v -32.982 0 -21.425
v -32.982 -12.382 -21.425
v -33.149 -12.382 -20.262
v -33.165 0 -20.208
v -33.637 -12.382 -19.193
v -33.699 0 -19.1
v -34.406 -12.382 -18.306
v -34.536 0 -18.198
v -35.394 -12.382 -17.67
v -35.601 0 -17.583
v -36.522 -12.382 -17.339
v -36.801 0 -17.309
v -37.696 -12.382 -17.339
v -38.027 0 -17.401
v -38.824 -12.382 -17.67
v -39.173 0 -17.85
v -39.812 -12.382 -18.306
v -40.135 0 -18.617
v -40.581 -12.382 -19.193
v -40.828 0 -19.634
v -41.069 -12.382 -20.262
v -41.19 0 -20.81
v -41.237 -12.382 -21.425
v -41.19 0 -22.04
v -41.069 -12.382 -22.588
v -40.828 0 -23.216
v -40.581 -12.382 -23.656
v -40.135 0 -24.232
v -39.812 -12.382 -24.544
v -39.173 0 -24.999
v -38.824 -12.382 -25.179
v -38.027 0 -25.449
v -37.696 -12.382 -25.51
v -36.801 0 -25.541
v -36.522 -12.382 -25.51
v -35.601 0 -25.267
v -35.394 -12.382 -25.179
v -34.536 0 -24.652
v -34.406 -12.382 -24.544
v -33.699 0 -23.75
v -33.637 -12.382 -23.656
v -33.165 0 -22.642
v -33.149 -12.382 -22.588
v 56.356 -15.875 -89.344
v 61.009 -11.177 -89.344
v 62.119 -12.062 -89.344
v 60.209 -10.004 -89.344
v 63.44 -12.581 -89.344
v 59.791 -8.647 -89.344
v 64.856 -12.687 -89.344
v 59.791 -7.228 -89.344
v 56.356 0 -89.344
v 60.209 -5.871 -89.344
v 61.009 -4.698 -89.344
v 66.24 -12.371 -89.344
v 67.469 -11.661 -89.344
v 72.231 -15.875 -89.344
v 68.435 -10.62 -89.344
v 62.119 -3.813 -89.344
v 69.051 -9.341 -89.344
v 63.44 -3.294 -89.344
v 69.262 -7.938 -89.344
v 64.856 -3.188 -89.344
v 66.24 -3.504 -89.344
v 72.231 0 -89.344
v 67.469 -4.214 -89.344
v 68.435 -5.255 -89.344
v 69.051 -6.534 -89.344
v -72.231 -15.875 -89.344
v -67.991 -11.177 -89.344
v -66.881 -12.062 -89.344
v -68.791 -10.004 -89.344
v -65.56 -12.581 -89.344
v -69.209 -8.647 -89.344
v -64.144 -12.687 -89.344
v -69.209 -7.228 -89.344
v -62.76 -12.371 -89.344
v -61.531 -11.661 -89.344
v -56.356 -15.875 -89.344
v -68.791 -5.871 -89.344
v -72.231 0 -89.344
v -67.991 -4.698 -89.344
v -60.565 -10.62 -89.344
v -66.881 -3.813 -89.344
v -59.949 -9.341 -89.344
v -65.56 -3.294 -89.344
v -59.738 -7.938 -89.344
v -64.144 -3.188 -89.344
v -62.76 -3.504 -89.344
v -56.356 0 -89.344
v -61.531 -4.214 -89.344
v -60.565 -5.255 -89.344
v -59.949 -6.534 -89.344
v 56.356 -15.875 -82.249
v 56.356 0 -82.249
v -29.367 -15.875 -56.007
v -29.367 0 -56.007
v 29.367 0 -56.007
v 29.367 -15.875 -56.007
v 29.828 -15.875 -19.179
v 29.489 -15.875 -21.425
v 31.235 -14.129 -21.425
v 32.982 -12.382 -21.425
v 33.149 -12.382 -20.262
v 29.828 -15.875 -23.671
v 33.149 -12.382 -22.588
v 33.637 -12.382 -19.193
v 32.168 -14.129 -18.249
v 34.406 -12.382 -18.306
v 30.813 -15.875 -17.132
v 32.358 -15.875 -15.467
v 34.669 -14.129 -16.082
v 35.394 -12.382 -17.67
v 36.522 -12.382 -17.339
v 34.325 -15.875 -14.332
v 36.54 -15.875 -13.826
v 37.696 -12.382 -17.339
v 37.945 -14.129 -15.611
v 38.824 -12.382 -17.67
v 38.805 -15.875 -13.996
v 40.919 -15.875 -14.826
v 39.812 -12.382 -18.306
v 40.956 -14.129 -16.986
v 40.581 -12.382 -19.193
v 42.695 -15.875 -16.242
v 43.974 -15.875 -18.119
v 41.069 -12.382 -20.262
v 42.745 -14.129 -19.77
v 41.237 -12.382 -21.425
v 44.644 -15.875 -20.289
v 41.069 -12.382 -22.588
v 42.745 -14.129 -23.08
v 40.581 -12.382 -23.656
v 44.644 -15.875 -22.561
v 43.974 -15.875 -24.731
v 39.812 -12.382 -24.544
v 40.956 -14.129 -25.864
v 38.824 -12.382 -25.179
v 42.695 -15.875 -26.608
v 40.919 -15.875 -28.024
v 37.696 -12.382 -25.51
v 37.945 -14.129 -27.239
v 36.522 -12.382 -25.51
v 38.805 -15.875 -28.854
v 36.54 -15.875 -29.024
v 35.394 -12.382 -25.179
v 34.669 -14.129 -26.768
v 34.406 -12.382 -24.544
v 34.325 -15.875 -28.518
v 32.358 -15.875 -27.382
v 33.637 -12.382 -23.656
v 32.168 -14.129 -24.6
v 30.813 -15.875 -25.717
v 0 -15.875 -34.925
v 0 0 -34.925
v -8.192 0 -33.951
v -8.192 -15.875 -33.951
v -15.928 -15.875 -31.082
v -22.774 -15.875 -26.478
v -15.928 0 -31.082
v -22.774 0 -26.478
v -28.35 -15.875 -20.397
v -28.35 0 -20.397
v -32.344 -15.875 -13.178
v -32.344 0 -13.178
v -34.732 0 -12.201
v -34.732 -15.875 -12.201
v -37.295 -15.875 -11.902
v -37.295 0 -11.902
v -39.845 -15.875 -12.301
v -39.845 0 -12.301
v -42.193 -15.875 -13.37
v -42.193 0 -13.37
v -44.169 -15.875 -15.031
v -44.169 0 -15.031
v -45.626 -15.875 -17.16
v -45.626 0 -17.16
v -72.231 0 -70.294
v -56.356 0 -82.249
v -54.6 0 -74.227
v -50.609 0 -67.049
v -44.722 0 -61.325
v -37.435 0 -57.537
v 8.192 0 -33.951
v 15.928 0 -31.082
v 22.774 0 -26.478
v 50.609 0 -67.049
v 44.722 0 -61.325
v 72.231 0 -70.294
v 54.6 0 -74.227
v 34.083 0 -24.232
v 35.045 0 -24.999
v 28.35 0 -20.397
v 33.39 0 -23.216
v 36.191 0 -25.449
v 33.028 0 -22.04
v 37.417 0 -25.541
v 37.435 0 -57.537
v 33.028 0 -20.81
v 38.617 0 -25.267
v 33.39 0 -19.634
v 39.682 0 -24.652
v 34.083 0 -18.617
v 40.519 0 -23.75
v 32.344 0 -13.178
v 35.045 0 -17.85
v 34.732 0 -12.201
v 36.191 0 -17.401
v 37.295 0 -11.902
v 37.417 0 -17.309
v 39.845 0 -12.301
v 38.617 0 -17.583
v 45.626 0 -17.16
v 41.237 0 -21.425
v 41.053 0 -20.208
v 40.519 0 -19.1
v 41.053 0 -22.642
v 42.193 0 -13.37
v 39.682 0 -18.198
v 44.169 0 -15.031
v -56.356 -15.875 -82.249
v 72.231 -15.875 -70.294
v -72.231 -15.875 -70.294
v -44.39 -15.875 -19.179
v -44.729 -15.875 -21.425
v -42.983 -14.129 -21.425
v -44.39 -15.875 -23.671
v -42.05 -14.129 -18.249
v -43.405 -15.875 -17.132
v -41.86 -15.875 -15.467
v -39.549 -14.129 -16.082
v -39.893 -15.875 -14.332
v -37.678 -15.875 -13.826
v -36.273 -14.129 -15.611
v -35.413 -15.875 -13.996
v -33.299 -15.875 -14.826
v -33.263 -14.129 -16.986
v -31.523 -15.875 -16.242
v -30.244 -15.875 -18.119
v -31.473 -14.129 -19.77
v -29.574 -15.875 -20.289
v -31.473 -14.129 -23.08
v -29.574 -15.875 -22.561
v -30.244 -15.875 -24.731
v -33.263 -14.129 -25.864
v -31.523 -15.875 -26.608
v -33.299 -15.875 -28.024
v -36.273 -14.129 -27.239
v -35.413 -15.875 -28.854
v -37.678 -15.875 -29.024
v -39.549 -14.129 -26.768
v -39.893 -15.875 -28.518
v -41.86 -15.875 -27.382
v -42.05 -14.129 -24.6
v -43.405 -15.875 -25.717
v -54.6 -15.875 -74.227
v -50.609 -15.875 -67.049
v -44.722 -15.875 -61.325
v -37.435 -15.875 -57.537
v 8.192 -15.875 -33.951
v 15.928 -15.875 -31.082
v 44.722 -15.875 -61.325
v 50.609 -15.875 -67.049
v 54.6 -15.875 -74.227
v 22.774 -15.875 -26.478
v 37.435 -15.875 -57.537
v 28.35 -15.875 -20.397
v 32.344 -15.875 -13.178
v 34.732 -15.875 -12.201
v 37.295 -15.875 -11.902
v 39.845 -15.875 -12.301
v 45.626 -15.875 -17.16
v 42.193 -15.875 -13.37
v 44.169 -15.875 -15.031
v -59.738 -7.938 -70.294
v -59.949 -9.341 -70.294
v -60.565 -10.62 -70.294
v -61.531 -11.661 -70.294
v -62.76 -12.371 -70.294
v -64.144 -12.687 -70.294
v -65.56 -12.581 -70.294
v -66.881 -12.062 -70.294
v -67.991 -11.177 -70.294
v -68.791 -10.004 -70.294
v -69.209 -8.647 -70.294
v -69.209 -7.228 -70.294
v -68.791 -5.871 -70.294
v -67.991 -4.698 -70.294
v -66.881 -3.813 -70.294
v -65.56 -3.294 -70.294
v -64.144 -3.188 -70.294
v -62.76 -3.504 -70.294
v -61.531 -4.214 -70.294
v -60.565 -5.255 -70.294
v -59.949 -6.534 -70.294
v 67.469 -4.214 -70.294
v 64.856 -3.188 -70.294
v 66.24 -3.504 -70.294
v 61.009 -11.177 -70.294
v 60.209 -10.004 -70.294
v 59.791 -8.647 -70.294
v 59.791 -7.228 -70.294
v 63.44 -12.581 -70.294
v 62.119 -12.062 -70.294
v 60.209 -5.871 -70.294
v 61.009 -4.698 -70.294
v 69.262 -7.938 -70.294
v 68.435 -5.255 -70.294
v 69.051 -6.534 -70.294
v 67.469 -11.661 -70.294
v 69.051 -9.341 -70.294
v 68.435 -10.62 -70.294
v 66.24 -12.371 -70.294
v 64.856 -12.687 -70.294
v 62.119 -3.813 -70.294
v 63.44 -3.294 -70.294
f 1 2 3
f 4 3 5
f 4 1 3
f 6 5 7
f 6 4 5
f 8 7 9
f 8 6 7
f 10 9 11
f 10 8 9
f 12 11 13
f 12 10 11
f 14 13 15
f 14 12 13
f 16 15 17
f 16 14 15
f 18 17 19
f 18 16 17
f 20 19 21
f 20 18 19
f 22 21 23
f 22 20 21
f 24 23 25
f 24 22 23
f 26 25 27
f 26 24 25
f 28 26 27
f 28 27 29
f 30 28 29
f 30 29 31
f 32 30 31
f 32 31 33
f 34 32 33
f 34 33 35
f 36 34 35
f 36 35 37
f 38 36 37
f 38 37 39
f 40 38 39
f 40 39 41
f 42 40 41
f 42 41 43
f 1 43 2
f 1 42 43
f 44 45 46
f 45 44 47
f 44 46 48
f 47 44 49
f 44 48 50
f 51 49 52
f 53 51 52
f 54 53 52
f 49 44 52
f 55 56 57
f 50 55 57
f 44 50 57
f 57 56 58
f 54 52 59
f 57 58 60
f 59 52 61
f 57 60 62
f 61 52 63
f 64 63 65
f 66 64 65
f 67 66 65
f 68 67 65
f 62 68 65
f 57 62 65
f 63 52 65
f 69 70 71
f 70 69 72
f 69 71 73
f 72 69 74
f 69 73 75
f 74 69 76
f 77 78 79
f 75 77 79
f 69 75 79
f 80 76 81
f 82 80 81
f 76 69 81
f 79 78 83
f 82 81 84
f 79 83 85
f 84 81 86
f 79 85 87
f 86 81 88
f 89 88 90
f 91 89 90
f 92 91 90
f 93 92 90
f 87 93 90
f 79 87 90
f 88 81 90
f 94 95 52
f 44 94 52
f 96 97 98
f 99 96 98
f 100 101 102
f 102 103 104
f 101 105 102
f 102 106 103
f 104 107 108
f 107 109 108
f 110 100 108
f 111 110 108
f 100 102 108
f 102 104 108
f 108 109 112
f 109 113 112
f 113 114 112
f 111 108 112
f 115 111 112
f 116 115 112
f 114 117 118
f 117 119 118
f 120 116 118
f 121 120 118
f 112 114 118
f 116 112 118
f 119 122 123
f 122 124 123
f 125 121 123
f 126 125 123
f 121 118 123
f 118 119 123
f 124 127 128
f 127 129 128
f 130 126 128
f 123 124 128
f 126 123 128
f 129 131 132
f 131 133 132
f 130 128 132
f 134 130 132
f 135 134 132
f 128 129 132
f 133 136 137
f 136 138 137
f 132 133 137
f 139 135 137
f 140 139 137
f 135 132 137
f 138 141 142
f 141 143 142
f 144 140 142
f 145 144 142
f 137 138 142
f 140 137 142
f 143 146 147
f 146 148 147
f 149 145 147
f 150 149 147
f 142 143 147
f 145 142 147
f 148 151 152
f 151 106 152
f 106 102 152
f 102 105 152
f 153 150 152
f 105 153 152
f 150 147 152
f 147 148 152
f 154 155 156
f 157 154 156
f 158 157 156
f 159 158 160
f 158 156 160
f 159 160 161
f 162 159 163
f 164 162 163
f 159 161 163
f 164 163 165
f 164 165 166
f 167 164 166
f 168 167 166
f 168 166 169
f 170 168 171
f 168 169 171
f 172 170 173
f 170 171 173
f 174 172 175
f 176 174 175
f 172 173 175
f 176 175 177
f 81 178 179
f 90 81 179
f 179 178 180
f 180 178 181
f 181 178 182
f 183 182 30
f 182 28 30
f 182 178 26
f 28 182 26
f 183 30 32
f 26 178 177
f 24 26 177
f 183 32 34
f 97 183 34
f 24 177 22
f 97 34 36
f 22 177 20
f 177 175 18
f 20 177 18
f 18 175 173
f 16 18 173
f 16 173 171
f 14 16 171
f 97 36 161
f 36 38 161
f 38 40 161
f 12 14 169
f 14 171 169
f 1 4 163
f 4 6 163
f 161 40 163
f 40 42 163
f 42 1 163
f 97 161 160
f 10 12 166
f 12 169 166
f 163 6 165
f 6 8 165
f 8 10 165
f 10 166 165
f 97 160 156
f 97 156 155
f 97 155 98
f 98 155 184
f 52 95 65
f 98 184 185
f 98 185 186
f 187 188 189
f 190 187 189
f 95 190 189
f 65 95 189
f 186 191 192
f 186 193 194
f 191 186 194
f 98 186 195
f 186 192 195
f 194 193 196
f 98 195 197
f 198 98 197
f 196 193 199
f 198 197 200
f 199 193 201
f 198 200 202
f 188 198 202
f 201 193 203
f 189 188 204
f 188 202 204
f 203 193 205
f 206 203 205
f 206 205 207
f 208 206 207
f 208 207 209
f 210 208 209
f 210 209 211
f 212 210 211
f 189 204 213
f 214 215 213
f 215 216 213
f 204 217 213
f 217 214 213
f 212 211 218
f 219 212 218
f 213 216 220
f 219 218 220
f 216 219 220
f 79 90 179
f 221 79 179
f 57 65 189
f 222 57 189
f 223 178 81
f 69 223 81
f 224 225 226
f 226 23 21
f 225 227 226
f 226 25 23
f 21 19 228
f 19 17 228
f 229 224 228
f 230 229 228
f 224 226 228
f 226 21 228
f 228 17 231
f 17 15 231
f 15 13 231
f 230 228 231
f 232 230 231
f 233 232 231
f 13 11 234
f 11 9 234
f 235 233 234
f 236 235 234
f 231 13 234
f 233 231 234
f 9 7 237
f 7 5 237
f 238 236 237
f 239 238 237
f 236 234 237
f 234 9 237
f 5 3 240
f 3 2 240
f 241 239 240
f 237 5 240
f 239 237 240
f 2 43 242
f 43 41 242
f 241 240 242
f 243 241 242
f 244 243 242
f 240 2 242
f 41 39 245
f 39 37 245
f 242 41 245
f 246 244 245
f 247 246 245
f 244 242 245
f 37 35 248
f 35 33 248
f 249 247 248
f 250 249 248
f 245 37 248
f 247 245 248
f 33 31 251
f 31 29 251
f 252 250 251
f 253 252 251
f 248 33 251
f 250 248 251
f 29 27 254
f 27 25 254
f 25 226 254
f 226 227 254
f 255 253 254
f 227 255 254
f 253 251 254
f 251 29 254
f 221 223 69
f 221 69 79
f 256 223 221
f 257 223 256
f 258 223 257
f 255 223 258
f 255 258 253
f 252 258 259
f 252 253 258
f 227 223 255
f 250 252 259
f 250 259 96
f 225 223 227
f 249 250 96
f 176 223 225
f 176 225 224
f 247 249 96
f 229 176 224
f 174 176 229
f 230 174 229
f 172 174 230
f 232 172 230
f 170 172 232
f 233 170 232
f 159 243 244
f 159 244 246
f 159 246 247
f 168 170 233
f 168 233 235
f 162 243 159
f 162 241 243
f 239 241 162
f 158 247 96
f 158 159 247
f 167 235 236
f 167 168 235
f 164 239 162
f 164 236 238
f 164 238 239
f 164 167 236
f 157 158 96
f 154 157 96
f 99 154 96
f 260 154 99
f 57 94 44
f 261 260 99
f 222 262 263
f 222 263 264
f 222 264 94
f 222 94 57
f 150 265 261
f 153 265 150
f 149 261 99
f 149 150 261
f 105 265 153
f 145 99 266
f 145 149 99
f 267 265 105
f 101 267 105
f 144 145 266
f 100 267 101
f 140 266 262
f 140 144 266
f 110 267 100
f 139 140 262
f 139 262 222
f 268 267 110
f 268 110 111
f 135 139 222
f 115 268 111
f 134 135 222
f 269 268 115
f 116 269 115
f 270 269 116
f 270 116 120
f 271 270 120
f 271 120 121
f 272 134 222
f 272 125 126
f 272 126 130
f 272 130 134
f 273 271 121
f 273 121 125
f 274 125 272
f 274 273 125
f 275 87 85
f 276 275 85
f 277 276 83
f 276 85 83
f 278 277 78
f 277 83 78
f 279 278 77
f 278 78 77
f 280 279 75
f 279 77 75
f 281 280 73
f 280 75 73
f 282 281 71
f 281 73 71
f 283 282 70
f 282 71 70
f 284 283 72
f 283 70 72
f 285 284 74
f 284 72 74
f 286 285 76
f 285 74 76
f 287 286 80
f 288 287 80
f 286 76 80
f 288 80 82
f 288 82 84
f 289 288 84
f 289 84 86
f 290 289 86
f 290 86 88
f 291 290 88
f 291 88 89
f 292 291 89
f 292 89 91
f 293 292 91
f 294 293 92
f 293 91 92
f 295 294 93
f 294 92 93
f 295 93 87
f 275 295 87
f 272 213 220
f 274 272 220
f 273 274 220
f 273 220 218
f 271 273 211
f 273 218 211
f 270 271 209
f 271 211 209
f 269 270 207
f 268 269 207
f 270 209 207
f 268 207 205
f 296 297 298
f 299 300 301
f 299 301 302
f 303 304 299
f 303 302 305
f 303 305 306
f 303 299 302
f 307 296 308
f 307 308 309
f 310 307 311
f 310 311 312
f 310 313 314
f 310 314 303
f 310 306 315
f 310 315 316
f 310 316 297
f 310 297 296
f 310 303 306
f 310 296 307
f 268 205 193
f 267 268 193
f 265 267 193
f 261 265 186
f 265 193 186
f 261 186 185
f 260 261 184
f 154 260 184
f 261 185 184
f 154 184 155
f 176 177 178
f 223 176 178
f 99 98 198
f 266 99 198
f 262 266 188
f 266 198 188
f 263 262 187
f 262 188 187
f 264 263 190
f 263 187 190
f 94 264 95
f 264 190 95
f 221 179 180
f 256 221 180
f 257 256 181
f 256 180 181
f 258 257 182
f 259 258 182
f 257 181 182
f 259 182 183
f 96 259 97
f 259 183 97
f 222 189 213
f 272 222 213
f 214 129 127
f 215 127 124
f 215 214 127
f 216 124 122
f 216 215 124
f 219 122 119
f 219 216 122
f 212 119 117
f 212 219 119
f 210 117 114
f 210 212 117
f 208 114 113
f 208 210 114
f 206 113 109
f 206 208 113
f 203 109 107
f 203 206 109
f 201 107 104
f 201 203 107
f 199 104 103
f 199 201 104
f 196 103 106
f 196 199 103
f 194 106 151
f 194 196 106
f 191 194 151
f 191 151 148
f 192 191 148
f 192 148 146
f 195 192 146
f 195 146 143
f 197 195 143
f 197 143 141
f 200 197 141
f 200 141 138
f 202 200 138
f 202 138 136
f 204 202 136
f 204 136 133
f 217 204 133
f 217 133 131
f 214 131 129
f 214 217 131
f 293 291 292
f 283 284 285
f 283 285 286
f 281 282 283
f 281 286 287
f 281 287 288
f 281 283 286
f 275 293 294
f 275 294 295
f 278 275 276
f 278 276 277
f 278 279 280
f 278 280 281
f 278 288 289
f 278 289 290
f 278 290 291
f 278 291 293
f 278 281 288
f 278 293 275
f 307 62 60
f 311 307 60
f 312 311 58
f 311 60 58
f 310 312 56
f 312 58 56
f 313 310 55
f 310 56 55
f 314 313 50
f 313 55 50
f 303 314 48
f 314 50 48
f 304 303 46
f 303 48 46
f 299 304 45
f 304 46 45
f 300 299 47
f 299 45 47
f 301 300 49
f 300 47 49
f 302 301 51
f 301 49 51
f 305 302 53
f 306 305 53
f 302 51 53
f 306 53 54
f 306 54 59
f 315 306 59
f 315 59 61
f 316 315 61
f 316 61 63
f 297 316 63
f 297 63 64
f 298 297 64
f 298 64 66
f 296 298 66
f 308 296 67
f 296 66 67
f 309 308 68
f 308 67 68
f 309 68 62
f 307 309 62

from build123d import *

# Parameters (mm, degrees)
F0_R           = 4.1275
F1_DEPTH       = 15.875
F3_D           = 8.255
F3_DEPTH       = 25.4
F3_CSINK_D     = 15.24
F3_CSINK_ANGLE = 90
F4_R           = 4.7625
F5_DEPTH       = 19.05


with BuildPart() as f1:
    # F0 (on Front) → F1 (new body)
    with BuildSketch(Plane.XZ):
        with BuildLine():
            ThreePointArc((0, -34.925), (-19.48747, -28.982653), (-32.343511, -13.177743))
            ThreePointArc((-32.343511, -13.177743), (-39.844625, -12.301191), (-45.625986, -17.160297))
            Line((-45.625986, -17.160297), (-72.23125, -70.2945))
            Line((-72.23125, -70.2945), (-72.23125, -89.3445))
            Line((-72.23125, -89.3445), (-56.35625, -89.3445))
            Line((-56.35625, -89.3445), (-56.35625, -86.1695))
            ThreePointArc((-56.35625, -86.1695), (-56.424398, -84.209267), (-56.35625, -82.249034))
            ThreePointArc((-56.35625, -82.249034), (-47.874791, -63.97181), (-29.36658, -56.007))
            ThreePointArc((-29.36658, -56.007), (-28.197928, -55.982797), (-27.029276, -56.007))
            Line((-27.029276, -56.007), (0, -56.007))
            Line((0, -56.007), (0, -34.925))
        make_face()
        with Locations((-37.109015, -21.4249)):
            Circle(F0_R, mode=Mode.SUBTRACT)
        with BuildLine():
            ThreePointArc((32.343511, -13.177743), (19.48747, -28.982653), (0, -34.925))
            Line((0, -34.925), (0, -56.007))
            Line((0, -56.007), (27.029276, -56.007))
            ThreePointArc((27.029276, -56.007), (28.197928, -55.982797), (29.36658, -56.007))
            ThreePointArc((29.36658, -56.007), (47.874791, -63.97181), (56.35625, -82.249034))
            ThreePointArc((56.35625, -82.249034), (56.424398, -84.209267), (56.35625, -86.1695))
            Line((56.35625, -86.1695), (56.35625, -89.3445))
            Line((56.35625, -89.3445), (72.23125, -89.3445))
            Line((72.23125, -89.3445), (72.23125, -70.2945))
            Line((72.23125, -70.2945), (45.625986, -17.160297))
            ThreePointArc((45.625986, -17.160297), (39.844625, -12.301191), (32.343511, -13.177743))
        make_face()
        with Locations((37.109015, -21.4249)):
            Circle(F0_R, mode=Mode.SUBTRACT)
        with BuildLine():
            Line((-29.36658, -56.007), (-27.029276, -56.007))
            ThreePointArc((-27.029276, -56.007), (-28.197928, -55.982797), (-29.36658, -56.007))
        make_face()
        with BuildLine():
            ThreePointArc((29.36658, -56.007), (28.197928, -55.982797), (27.029276, -56.007))
            Line((27.029276, -56.007), (29.36658, -56.007))
        make_face()
        with BuildLine():
            Line((-56.35625, -86.1695), (-56.35625, -82.249034))
            ThreePointArc((-56.35625, -82.249034), (-56.424398, -84.209267), (-56.35625, -86.1695))
        make_face()
        with BuildLine():
            ThreePointArc((56.35625, -86.1695), (56.424398, -84.209267), (56.35625, -82.249034))
            Line((56.35625, -82.249034), (56.35625, -86.1695))
        make_face()
    extrude(amount=F1_DEPTH)

    # F3
    with Locations(Plane.XZ.offset(15.875)):
        with Locations((-37.109015, -21.4249), (37.109015, -21.4249)):
            CounterSinkHole(F3_D / 2, F3_CSINK_D / 2, depth=F3_DEPTH, counter_sink_angle=F3_CSINK_ANGLE)

    # F4 (on face) → F5 (cut)
    with BuildSketch(Plane(origin=(0, 0, -89.3445), x_dir=(1, 0, 0), z_dir=(0, 0, -1))):
        with Locations((-64.5, 7.9375)):
            Circle(F4_R)
        with Locations((64.5, 7.9375)):
            Circle(F4_R)
    extrude(amount=-F5_DEPTH, mode=Mode.SUBTRACT)


solid = f1.part
